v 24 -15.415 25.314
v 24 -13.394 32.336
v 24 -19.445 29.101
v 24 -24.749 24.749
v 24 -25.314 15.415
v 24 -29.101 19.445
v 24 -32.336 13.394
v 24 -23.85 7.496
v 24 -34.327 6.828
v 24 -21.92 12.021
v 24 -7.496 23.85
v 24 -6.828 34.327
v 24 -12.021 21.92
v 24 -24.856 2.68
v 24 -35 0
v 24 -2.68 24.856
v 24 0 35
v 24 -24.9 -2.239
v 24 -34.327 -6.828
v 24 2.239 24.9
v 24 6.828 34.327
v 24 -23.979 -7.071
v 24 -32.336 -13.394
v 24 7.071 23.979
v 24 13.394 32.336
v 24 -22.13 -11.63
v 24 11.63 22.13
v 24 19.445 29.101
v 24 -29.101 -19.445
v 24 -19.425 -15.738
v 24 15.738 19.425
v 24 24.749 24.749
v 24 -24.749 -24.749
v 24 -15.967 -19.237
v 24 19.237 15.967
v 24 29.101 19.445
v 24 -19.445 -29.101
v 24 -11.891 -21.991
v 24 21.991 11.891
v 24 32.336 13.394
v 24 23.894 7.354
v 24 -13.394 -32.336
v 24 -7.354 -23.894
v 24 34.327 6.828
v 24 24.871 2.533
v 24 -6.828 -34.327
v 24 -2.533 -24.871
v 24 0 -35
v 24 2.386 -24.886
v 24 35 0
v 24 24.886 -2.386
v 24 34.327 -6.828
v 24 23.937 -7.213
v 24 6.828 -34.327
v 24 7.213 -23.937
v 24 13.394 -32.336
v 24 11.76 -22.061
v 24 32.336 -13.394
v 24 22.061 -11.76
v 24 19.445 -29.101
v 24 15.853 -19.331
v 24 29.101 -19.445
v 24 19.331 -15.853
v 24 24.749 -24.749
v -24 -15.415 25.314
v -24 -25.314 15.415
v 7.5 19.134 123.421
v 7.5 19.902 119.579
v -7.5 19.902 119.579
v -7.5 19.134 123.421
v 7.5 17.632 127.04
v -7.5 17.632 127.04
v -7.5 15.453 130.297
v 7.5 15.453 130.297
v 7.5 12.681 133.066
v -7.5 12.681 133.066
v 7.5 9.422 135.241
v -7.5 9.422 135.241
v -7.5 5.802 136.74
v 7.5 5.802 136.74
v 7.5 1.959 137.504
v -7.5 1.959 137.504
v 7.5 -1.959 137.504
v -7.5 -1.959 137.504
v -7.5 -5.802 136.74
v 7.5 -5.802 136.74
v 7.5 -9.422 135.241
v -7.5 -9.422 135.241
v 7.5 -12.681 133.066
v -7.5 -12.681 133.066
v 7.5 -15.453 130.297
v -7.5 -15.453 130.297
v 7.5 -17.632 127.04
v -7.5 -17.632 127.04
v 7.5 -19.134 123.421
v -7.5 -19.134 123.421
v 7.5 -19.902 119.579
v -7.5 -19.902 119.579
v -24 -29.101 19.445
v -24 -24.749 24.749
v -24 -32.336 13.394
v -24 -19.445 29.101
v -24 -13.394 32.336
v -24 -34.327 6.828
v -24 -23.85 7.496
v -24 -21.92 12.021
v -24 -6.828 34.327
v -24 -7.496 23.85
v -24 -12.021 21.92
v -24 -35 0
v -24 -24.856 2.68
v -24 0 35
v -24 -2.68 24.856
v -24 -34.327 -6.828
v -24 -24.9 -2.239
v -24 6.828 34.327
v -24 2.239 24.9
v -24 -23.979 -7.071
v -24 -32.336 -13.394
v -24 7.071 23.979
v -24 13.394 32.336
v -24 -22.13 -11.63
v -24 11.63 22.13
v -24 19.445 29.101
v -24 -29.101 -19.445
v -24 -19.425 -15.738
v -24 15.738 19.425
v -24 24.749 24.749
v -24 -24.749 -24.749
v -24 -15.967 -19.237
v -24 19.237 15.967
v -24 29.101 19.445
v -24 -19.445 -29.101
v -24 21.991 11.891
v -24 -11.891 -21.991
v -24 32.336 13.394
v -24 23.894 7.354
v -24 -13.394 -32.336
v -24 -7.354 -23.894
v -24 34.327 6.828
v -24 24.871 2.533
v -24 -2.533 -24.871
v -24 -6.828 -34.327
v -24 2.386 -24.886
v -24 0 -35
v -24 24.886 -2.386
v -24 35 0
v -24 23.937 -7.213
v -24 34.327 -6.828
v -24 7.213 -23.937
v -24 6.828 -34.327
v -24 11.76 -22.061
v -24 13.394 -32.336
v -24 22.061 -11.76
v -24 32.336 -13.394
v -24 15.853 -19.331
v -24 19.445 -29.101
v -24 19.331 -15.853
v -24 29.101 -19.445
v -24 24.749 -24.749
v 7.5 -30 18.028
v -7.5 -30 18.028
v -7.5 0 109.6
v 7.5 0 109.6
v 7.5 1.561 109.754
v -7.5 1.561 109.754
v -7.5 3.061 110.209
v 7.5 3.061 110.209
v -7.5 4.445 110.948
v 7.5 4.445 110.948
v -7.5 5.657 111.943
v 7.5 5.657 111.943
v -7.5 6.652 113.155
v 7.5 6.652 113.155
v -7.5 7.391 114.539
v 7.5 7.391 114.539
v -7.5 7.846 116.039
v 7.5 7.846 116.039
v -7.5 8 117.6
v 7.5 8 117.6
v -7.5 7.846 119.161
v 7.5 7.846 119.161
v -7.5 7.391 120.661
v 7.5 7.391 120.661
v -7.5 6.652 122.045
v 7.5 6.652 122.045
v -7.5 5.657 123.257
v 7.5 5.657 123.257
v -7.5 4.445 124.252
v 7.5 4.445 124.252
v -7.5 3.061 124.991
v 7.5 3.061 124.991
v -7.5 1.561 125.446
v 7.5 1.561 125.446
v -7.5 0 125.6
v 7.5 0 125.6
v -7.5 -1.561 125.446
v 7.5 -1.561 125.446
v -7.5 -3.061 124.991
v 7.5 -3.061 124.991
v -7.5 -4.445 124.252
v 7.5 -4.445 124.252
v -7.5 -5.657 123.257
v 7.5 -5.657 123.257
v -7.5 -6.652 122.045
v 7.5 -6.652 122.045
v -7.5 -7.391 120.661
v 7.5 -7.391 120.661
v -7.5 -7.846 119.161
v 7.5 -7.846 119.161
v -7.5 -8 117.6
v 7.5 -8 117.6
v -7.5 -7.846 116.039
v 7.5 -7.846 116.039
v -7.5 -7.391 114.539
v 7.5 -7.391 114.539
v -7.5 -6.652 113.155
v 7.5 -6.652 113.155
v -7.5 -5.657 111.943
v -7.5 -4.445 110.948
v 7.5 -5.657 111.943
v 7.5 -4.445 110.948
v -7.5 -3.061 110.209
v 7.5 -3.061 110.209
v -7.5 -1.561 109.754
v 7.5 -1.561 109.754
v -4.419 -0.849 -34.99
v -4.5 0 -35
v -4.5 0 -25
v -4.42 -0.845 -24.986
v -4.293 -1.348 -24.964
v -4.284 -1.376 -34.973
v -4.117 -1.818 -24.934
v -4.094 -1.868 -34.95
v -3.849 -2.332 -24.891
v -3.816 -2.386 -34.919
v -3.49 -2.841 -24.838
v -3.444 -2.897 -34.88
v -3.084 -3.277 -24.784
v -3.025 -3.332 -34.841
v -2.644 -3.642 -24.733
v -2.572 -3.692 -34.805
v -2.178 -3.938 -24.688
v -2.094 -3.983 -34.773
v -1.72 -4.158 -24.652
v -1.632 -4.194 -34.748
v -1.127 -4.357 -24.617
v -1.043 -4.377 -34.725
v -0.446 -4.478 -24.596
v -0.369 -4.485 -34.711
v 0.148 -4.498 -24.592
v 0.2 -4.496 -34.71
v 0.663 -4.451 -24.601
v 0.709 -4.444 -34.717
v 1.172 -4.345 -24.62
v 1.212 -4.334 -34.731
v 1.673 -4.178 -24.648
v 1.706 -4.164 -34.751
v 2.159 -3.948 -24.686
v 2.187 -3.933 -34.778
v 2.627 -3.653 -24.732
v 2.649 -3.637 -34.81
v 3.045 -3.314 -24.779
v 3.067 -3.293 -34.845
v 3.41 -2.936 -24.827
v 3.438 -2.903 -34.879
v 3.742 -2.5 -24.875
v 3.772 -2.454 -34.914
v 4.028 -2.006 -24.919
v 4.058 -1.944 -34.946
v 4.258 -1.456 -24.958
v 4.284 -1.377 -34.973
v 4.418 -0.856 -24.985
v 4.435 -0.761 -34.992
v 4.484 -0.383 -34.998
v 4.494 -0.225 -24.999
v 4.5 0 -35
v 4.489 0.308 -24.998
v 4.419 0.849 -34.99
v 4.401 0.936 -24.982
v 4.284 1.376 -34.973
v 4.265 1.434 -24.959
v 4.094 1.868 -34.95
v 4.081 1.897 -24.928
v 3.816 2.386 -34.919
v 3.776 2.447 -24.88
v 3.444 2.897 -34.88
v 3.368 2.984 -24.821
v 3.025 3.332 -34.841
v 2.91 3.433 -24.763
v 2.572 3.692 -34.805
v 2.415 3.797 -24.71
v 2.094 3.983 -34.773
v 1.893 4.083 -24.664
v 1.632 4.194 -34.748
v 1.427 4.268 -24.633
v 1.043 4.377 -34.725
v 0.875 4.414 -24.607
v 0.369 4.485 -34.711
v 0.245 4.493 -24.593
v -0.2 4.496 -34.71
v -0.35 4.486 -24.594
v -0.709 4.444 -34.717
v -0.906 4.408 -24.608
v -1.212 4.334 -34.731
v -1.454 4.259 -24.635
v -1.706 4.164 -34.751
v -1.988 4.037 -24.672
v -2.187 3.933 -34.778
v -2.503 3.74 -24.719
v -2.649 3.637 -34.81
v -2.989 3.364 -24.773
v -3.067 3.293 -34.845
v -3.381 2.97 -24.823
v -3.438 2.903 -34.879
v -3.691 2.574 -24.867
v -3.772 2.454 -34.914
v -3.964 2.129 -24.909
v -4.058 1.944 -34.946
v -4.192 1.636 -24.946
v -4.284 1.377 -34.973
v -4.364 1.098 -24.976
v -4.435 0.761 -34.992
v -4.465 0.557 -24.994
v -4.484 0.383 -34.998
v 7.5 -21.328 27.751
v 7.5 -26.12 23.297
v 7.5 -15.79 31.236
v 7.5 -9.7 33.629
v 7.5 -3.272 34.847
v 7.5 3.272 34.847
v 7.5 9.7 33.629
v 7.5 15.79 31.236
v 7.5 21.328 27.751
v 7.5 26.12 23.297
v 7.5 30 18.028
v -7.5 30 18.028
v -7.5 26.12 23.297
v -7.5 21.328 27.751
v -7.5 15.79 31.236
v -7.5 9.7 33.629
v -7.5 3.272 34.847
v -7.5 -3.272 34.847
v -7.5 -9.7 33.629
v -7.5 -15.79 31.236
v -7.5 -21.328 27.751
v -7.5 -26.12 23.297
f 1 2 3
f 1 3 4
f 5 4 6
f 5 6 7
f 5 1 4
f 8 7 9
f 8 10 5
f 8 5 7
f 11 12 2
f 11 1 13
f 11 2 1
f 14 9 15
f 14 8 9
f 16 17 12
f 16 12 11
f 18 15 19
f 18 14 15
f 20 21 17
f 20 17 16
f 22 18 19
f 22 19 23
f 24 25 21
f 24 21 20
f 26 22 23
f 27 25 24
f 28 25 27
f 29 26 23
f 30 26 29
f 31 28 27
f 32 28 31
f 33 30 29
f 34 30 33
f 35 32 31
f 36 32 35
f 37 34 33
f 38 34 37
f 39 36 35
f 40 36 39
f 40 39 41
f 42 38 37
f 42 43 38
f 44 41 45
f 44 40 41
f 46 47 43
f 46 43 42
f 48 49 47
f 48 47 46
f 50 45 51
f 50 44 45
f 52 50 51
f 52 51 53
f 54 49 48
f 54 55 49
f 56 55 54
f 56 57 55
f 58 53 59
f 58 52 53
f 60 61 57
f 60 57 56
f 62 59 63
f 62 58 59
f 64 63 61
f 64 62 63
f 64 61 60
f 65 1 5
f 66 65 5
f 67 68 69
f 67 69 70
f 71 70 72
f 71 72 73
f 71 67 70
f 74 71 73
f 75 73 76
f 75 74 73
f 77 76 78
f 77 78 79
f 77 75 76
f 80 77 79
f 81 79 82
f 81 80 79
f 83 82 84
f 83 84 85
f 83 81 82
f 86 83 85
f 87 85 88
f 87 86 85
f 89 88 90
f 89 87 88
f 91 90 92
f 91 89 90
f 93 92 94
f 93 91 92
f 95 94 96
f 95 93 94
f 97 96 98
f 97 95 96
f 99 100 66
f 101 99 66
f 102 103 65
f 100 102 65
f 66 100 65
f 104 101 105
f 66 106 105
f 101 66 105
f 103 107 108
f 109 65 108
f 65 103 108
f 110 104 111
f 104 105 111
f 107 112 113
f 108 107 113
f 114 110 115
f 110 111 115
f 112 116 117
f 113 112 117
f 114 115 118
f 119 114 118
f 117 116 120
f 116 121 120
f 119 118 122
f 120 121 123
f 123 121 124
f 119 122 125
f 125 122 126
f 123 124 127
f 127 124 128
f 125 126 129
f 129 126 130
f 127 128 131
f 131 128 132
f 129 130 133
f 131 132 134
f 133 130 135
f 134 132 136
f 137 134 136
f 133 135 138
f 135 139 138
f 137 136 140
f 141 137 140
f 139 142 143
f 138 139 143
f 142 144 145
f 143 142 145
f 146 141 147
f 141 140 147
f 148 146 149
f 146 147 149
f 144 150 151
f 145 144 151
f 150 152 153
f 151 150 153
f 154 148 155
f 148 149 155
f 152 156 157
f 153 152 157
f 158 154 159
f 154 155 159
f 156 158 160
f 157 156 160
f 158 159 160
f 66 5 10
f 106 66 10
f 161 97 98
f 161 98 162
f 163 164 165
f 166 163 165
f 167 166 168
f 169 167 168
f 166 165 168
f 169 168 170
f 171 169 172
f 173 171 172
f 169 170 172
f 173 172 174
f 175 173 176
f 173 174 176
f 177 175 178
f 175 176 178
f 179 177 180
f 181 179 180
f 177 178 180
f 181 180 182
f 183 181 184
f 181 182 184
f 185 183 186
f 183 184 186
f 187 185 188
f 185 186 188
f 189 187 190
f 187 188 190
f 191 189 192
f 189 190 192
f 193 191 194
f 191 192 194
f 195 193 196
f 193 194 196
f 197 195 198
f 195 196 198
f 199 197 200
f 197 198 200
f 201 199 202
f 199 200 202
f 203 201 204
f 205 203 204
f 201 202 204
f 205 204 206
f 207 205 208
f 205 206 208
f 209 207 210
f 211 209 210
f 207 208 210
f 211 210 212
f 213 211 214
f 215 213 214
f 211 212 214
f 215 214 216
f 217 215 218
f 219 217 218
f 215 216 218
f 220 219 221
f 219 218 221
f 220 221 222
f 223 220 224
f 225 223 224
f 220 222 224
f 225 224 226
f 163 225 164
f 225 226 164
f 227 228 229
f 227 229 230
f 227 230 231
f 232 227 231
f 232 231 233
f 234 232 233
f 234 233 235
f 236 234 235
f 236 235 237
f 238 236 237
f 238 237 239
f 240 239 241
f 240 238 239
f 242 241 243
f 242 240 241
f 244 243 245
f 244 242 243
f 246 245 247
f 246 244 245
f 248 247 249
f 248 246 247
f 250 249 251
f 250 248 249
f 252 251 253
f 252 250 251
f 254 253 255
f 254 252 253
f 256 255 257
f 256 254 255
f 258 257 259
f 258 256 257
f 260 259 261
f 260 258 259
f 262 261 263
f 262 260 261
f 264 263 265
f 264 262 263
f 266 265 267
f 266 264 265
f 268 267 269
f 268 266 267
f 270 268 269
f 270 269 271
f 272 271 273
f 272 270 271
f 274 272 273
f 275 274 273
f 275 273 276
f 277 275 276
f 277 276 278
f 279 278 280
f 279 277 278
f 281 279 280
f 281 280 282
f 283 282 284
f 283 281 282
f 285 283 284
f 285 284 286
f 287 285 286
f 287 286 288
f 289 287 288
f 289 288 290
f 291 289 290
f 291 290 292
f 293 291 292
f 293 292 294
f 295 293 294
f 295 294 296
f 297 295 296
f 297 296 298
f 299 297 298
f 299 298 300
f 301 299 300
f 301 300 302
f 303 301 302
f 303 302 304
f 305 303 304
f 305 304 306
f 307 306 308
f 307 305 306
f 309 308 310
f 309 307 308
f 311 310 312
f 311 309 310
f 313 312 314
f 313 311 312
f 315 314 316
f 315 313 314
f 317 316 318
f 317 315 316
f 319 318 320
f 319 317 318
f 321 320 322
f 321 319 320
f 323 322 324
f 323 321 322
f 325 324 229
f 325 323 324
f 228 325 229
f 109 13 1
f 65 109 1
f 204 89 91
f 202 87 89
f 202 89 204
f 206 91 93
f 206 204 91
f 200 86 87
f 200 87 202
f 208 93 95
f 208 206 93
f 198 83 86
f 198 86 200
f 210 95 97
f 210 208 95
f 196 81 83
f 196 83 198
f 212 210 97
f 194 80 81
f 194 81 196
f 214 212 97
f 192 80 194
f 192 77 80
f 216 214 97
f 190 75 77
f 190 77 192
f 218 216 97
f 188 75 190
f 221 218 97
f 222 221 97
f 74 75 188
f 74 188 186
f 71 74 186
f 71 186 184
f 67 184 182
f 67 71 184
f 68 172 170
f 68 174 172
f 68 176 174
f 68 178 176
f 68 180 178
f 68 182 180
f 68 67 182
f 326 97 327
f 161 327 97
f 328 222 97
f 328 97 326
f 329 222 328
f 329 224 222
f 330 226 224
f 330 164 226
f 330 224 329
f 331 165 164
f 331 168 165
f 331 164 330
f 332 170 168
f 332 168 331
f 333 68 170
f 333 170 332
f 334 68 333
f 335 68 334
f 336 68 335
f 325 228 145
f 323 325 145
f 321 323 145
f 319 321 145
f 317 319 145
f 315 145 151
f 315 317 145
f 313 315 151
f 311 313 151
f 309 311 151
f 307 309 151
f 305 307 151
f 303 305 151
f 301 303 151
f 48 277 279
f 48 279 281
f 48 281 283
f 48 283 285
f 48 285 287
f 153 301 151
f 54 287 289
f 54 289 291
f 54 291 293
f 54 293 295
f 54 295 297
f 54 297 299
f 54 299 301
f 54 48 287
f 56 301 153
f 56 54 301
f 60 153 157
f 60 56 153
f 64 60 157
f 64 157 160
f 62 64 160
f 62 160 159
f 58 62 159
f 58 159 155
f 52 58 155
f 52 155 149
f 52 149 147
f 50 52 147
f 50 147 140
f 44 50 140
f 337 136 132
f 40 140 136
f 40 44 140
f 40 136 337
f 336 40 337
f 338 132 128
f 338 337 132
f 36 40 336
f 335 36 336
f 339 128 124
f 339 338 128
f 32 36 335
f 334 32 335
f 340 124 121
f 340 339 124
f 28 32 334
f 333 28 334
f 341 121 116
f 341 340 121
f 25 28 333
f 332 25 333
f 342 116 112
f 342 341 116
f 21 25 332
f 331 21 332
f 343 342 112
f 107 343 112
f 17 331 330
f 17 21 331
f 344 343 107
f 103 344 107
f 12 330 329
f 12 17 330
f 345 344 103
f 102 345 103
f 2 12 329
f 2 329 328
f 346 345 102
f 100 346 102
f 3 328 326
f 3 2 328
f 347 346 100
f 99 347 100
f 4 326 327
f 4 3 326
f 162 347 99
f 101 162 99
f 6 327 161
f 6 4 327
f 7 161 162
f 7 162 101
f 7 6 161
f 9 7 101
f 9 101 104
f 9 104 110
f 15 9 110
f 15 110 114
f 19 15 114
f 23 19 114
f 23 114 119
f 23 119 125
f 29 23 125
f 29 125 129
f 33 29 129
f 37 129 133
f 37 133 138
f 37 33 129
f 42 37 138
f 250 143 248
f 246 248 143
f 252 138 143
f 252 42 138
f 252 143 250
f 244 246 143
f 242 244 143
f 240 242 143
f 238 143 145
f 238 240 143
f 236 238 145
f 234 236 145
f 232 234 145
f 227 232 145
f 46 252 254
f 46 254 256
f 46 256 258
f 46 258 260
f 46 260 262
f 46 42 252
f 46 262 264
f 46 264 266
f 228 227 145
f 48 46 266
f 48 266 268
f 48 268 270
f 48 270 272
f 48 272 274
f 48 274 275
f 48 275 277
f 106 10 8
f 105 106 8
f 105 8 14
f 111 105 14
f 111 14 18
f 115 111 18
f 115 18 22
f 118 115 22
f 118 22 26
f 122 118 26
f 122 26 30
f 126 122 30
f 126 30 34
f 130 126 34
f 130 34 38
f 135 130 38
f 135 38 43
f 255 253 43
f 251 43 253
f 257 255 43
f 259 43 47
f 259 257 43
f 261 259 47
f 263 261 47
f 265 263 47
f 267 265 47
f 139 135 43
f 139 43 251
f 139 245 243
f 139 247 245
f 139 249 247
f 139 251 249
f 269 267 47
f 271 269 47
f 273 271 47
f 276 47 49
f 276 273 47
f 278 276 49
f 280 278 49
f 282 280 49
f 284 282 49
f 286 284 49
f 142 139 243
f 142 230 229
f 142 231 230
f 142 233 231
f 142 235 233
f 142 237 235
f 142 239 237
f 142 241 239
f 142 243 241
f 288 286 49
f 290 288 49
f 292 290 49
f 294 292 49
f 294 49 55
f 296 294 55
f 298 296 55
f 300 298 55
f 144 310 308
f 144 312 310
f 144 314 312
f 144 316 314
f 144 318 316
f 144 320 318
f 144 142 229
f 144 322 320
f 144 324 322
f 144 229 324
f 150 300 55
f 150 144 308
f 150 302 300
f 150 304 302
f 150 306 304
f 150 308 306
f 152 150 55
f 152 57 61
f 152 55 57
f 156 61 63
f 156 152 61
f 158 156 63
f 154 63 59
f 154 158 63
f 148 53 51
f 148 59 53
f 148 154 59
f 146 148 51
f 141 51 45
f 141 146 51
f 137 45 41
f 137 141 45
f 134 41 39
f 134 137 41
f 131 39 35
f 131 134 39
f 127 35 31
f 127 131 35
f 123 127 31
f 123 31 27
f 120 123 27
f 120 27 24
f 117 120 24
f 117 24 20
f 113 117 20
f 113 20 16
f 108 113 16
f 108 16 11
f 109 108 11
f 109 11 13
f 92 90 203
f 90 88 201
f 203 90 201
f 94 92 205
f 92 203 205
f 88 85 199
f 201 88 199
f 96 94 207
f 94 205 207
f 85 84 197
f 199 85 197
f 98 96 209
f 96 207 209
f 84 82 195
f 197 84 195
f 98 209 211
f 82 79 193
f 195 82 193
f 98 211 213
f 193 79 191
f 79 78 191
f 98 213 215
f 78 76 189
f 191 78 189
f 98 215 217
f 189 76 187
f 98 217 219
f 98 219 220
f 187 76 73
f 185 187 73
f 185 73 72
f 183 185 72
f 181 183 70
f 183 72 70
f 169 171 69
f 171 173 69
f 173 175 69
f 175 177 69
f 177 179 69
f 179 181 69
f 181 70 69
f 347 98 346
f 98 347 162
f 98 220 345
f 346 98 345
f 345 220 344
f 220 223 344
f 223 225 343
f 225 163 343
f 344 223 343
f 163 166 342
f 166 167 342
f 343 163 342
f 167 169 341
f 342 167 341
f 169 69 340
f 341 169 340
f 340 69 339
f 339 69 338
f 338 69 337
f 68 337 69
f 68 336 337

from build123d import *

# Parameters (mm, degrees)
SKETCH1_R           = 35
SKETCH1_R_2         = 25
BOSS_EXTRUDE1_DEPTH = 24
BOSS_EXTRUDE2_DEPTH = 7.5
SKETCH3_R           = 8
CUT_EXTRUDE1_DEPTH  = 15
CUT_EXTRUDE2_DEPTH  = 150.875815261
SKETCH6_R           = 4.5
CUT_EXTRUDE3_DEPTH  = 24


with BuildPart() as part:
    # Sketch1 → Boss-Extrude1 (new, symmetric)
    with BuildSketch(Plane(origin=(0, 0, 0), x_dir=(0, 0, -1), z_dir=(1, 0, 0))):
        Circle(SKETCH1_R)
        Circle(SKETCH1_R_2, mode=Mode.SUBTRACT)
    extrude(amount=BOSS_EXTRUDE1_DEPTH, both=True)

    # Sketch2 → Boss-Extrude2 (add, symmetric)
    with BuildSketch(Plane(origin=(0, 0, 0), x_dir=(0, 0, -1), z_dir=(1, 0, 0))):
        with BuildLine():
            Line((-18.027756377, 30), (-119.579019246, 19.901846216))
            ThreePointArc((-119.579019246, 19.901846216), (-137.6, 0), (-119.579019246, -19.901846216))
            Line((-119.579019246, -19.901846216), (-18.027756377, -30))
            ThreePointArc((-18.027756377, -30), (-35, 0), (-18.027756377, 30))
        make_face()
    extrude(amount=BOSS_EXTRUDE2_DEPTH, both=True)

    # Sketch3 → Cut-Extrude1 (cut)
    with BuildSketch(Plane(origin=(7.5, 0, 0), x_dir=(0, 0, -1), z_dir=(1, 0, 0))):
        with Locations((-117.6, 0)):
            Circle(SKETCH3_R)
    extrude(amount=-CUT_EXTRUDE1_DEPTH, mode=Mode.SUBTRACT)

    # Sketch5 → Cut-Extrude2 (cut, through all)
    with BuildSketch(Plane(origin=(24, 0, 0), x_dir=(0, 0, -1), z_dir=(1, 0, 0))):
        Polygon((-3.702856162, 6.196638775), (-25.314422766, -15.41492783), (-15.41492783, -25.314422766), (6.196638775, -3.702856162), align=None)
    extrude(amount=-CUT_EXTRUDE2_DEPTH, mode=Mode.SUBTRACT)

    # Sketch6 → Cut-Extrude3 (cut)
    with BuildSketch(Plane.XY.offset(-35)):
        with Locations(Location((0, 0, 0), (0, 0, 180))):
            Circle(SKETCH6_R)
    extrude(amount=CUT_EXTRUDE3_DEPTH, mode=Mode.SUBTRACT)


solid = part.part
